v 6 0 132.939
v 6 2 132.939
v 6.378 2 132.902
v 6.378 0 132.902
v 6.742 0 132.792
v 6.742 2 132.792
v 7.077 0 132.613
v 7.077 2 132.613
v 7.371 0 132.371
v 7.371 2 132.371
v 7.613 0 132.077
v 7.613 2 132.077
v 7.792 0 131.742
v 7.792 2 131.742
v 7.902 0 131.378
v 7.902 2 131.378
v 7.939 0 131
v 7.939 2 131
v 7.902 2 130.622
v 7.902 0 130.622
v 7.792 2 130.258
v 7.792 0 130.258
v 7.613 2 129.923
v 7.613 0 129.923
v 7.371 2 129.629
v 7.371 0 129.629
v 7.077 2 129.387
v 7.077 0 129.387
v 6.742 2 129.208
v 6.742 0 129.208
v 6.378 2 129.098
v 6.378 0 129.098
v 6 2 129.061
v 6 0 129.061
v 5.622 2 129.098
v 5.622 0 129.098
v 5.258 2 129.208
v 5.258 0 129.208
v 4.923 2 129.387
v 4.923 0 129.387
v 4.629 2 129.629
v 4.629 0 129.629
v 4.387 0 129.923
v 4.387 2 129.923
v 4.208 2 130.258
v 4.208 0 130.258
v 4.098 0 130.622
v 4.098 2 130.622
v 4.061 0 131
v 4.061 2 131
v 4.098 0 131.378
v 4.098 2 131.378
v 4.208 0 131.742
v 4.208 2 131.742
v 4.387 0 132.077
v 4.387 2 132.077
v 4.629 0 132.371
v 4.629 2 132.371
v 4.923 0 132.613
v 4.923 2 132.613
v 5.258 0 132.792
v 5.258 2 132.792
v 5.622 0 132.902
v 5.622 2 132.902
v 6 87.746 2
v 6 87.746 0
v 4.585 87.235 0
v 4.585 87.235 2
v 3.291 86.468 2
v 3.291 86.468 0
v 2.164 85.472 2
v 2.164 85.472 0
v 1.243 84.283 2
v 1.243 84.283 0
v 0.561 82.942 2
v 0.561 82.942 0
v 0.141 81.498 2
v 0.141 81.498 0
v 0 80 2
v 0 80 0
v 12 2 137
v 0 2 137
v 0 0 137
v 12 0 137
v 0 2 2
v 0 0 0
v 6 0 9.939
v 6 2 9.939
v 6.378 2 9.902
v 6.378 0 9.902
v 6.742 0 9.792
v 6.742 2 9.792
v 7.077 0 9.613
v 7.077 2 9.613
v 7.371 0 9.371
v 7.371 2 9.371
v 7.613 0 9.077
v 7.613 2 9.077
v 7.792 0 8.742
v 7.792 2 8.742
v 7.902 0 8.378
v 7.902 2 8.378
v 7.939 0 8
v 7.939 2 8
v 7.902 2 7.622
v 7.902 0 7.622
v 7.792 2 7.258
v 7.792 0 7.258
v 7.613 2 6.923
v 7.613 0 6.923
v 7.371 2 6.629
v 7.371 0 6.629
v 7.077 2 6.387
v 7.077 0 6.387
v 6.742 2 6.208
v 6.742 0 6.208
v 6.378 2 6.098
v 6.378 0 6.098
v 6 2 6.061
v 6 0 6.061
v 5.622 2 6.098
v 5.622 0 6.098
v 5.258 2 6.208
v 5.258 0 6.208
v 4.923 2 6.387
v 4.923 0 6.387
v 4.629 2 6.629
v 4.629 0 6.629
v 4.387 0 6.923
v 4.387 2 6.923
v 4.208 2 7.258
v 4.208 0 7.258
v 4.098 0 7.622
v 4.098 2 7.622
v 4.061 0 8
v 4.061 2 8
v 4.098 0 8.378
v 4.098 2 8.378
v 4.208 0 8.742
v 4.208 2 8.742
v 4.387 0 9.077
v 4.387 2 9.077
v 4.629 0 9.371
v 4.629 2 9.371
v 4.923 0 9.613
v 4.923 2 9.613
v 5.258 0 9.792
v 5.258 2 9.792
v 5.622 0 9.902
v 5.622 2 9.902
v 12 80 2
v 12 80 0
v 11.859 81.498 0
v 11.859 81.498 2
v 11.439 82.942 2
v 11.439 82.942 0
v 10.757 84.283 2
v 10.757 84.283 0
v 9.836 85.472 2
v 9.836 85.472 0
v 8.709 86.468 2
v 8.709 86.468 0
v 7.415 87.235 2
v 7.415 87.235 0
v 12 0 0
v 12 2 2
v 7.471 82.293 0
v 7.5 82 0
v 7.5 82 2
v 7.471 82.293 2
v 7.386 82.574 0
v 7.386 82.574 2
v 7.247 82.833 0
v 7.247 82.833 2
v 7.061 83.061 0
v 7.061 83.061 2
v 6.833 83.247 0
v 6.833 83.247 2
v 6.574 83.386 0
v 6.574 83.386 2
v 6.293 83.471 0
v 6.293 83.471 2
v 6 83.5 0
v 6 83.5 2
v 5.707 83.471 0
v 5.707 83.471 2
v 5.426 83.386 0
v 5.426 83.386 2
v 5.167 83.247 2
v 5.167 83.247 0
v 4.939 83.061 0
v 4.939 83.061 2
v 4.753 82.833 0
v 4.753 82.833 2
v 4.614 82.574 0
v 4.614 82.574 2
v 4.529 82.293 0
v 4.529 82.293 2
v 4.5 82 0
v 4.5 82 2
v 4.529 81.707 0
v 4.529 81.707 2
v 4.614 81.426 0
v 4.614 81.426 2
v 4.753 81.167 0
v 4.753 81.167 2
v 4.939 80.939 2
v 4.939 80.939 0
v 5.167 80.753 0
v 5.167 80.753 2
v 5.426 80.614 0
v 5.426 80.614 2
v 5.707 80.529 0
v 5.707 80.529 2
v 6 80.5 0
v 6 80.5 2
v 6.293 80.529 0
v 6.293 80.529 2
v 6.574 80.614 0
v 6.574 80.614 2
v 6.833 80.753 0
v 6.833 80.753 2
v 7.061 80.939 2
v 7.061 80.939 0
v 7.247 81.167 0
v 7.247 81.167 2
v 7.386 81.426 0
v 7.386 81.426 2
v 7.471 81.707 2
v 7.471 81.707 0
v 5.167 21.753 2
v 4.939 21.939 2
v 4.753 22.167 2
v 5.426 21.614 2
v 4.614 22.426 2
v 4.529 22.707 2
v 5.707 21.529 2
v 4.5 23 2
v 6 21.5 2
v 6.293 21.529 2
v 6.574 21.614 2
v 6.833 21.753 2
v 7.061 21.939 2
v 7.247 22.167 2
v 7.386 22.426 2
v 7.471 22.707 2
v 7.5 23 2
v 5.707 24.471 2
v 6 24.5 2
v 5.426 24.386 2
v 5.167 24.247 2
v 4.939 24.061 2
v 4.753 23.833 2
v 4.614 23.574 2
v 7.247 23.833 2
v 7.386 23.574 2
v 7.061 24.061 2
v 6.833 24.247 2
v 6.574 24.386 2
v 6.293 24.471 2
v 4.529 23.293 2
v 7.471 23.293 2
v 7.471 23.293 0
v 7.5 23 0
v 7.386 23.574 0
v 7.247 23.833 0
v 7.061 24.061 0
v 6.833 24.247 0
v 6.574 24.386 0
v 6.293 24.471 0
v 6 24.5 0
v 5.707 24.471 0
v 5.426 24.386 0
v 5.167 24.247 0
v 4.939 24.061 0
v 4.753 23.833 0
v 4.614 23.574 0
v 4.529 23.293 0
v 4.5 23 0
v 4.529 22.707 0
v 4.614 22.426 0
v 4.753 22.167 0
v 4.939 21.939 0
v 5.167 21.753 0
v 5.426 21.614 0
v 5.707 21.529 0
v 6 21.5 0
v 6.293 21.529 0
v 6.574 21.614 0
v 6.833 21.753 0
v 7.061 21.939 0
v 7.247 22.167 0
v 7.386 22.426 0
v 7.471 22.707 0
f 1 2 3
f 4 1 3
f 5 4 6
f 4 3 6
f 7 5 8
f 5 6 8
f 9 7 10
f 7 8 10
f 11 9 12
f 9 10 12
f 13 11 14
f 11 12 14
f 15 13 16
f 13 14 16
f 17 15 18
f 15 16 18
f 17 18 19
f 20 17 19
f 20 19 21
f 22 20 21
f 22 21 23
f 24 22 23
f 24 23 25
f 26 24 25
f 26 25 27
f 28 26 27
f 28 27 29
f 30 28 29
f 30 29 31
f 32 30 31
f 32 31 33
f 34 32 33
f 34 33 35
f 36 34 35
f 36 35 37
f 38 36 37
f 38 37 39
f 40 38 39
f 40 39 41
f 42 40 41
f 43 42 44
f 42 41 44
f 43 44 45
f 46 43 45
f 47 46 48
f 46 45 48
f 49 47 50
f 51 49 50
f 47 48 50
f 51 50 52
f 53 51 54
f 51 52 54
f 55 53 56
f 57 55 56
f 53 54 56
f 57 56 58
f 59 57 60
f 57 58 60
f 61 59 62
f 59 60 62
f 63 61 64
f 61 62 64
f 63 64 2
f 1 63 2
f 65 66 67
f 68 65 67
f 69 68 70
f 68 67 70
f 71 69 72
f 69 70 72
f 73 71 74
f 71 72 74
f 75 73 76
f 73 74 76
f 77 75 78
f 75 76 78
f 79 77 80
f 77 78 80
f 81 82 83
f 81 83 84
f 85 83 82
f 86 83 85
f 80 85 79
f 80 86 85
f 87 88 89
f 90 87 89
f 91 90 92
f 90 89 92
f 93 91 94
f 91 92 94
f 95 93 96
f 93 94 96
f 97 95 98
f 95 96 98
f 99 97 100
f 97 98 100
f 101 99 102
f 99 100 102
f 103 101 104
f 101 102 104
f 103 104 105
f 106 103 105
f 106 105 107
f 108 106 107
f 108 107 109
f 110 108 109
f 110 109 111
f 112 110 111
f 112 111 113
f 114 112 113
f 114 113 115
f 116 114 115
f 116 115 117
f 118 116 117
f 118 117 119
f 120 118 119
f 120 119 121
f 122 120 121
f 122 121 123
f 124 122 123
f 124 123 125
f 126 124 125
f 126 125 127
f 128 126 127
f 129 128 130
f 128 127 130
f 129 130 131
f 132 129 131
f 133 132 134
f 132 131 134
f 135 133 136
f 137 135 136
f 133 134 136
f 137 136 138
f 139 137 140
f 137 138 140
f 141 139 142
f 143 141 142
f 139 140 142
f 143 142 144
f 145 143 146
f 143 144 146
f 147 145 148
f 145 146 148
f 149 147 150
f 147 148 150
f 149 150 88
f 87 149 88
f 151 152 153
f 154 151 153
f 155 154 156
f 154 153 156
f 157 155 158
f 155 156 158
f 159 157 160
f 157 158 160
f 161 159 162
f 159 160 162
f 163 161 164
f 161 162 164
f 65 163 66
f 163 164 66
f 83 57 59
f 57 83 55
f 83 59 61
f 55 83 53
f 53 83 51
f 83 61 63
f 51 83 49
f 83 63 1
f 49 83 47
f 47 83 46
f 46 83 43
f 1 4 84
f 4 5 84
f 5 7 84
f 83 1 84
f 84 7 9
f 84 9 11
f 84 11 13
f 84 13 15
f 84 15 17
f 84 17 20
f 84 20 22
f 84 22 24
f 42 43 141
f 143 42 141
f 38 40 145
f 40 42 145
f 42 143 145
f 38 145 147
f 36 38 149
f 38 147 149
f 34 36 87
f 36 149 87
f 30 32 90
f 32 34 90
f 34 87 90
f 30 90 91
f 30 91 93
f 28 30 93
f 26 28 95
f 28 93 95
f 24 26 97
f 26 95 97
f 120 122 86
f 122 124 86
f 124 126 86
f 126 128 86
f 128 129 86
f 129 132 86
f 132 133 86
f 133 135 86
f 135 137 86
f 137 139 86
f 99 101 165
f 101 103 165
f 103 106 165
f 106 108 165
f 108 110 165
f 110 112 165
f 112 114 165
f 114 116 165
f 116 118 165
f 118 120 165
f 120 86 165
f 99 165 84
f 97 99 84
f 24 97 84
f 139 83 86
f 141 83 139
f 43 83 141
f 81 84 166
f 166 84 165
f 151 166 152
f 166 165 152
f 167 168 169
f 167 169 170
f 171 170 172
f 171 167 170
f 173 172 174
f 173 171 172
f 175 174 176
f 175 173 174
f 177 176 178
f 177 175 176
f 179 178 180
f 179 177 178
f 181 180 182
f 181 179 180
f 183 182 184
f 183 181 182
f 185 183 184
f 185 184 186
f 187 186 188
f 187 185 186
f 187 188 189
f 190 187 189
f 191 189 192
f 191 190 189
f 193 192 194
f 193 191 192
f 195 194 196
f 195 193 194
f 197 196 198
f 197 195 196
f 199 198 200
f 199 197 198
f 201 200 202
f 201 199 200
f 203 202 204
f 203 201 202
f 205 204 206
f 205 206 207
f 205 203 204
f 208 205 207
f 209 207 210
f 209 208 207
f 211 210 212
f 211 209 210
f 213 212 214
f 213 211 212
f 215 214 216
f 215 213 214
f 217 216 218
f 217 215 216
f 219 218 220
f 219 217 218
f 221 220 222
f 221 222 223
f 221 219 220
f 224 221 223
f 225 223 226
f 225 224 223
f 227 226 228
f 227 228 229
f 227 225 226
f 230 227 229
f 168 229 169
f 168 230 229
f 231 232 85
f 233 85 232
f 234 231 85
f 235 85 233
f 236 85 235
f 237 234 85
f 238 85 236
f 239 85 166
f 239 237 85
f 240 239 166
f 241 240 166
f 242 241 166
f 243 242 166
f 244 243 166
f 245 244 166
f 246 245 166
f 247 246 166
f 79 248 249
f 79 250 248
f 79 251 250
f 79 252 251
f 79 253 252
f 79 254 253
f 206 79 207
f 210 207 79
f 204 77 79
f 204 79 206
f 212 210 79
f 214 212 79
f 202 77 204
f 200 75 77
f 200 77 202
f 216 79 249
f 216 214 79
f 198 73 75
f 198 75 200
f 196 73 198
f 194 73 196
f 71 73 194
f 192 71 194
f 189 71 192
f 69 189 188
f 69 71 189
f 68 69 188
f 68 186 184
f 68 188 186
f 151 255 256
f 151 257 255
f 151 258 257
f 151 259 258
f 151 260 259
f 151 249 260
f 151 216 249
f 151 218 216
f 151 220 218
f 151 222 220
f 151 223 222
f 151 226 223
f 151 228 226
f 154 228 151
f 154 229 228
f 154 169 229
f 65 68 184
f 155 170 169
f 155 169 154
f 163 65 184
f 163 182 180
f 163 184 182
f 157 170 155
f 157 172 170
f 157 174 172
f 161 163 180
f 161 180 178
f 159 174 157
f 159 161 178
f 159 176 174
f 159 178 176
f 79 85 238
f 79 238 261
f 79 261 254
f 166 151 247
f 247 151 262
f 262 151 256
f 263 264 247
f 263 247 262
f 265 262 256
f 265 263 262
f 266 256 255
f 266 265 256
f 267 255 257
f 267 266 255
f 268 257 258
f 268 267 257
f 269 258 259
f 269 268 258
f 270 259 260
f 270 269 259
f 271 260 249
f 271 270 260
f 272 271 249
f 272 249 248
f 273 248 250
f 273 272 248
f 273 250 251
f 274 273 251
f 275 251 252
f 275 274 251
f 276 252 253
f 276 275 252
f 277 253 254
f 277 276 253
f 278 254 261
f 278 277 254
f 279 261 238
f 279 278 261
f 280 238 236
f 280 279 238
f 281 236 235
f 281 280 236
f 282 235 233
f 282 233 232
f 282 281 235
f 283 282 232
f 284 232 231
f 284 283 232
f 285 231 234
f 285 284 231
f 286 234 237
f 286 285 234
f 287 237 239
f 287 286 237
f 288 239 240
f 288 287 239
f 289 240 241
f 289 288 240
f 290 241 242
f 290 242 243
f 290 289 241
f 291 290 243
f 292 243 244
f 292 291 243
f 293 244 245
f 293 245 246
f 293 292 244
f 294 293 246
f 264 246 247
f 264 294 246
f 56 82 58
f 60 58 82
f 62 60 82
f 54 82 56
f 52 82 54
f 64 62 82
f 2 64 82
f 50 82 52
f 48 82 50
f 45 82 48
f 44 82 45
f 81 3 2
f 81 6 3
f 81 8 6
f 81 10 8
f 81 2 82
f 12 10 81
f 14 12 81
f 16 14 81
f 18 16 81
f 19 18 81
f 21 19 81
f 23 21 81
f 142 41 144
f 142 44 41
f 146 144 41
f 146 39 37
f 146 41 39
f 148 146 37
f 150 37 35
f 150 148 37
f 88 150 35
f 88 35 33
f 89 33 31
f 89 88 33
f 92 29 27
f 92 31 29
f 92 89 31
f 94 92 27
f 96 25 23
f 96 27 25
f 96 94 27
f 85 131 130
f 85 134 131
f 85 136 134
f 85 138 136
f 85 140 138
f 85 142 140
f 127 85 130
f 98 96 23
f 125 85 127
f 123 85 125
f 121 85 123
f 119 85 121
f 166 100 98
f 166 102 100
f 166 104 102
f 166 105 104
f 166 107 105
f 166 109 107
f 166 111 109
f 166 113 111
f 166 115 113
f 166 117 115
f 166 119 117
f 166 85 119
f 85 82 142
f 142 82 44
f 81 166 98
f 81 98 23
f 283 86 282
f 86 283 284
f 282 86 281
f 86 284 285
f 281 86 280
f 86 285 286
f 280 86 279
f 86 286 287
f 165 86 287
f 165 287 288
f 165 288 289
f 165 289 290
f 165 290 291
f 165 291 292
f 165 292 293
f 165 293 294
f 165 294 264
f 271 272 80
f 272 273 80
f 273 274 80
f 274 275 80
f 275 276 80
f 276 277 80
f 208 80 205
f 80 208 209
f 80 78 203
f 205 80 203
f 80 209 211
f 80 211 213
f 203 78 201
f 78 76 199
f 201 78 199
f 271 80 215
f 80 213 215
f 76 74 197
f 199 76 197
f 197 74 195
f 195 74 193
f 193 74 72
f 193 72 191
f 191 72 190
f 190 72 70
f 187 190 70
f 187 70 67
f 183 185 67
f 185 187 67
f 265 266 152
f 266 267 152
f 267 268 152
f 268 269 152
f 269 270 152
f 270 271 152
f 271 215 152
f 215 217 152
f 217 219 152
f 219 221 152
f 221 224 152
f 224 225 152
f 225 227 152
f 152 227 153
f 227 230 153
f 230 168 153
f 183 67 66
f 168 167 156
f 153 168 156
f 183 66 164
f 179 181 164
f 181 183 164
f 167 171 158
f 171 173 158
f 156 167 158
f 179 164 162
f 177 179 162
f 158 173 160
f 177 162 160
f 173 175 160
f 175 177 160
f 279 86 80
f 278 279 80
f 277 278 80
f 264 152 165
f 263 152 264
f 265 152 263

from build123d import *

# Parameters (mm, degrees)
SKETCH1_W           = 12
SKETCH1_H           = 88
SKETCH1_R           = 1.5
BOSS_EXTRUDE1_DEPTH = 2
SKETCH2_W           = 12
SKETCH2_H           = 2
BOSS_EXTRUDE2_DEPTH = 135
FILLET1_R           = 8
SKETCH3_R           = 1.939400698
CUT_EXTRUDE1_DEPTH  = 163.065945849


with BuildPart() as part:
    # Sketch1 → Boss-Extrude1 (new body)
    with BuildSketch(Plane.XY):
        with Locations((6, 44)):
            Rectangle(SKETCH1_W, SKETCH1_H)
        with Locations((6, 82)):
            Circle(SKETCH1_R, mode=Mode.SUBTRACT)
        with Locations((6, 23)):
            Circle(SKETCH1_R, mode=Mode.SUBTRACT)
    extrude(amount=BOSS_EXTRUDE1_DEPTH)

    # Sketch2 → Boss-Extrude2 (add)
    with BuildSketch(Plane.XY.offset(2)):
        with Locations((6, 1)):
            Rectangle(SKETCH2_W, SKETCH2_H)
    extrude(amount=BOSS_EXTRUDE2_DEPTH)

    # Fillet1
    # the kernel refuses this fillet: 8 mm, written as the material it takes off along each edge
    with BuildSketch(Plane(origin=(12, 88, -20), x_dir=(-1, 0, 0), z_dir=(0, 0, 1))) as fillet1_piece_1:
        with BuildLine():
            CenterArc((FILLET1_R, FILLET1_R), FILLET1_R, 180, 90)
            Line((0, FILLET1_R), (0, 0))
            Line((0, 0), (FILLET1_R, 0))
        make_face()
    extrude(amount=42, mode=Mode.SUBTRACT)
    with BuildSketch(Plane(origin=(0, 88, -20), x_dir=(1, 0, 0), z_dir=(0, 0, 1))) as fillet1_piece_2:
        with BuildLine():
            CenterArc((FILLET1_R, -FILLET1_R), FILLET1_R, 90, 90)
            Line((0, -FILLET1_R), (0, 0))
            Line((0, 0), (FILLET1_R, 0))
        make_face()
    extrude(amount=42, mode=Mode.SUBTRACT)

    # Sketch3 → Cut-Extrude1 (cut, through all)
    with BuildSketch(Plane(origin=(0, 2, 0), x_dir=(1, 0, 0), z_dir=(0, 1, 0))):
        with Locations(Location((6, -131, 0), (0, 0, 270))):
            Circle(SKETCH3_R)
        with Locations(Location((6, -8, 0), (0, 0, 270))):
            Circle(SKETCH3_R)
    extrude(amount=-CUT_EXTRUDE1_DEPTH, mode=Mode.SUBTRACT)


solid = part.part
